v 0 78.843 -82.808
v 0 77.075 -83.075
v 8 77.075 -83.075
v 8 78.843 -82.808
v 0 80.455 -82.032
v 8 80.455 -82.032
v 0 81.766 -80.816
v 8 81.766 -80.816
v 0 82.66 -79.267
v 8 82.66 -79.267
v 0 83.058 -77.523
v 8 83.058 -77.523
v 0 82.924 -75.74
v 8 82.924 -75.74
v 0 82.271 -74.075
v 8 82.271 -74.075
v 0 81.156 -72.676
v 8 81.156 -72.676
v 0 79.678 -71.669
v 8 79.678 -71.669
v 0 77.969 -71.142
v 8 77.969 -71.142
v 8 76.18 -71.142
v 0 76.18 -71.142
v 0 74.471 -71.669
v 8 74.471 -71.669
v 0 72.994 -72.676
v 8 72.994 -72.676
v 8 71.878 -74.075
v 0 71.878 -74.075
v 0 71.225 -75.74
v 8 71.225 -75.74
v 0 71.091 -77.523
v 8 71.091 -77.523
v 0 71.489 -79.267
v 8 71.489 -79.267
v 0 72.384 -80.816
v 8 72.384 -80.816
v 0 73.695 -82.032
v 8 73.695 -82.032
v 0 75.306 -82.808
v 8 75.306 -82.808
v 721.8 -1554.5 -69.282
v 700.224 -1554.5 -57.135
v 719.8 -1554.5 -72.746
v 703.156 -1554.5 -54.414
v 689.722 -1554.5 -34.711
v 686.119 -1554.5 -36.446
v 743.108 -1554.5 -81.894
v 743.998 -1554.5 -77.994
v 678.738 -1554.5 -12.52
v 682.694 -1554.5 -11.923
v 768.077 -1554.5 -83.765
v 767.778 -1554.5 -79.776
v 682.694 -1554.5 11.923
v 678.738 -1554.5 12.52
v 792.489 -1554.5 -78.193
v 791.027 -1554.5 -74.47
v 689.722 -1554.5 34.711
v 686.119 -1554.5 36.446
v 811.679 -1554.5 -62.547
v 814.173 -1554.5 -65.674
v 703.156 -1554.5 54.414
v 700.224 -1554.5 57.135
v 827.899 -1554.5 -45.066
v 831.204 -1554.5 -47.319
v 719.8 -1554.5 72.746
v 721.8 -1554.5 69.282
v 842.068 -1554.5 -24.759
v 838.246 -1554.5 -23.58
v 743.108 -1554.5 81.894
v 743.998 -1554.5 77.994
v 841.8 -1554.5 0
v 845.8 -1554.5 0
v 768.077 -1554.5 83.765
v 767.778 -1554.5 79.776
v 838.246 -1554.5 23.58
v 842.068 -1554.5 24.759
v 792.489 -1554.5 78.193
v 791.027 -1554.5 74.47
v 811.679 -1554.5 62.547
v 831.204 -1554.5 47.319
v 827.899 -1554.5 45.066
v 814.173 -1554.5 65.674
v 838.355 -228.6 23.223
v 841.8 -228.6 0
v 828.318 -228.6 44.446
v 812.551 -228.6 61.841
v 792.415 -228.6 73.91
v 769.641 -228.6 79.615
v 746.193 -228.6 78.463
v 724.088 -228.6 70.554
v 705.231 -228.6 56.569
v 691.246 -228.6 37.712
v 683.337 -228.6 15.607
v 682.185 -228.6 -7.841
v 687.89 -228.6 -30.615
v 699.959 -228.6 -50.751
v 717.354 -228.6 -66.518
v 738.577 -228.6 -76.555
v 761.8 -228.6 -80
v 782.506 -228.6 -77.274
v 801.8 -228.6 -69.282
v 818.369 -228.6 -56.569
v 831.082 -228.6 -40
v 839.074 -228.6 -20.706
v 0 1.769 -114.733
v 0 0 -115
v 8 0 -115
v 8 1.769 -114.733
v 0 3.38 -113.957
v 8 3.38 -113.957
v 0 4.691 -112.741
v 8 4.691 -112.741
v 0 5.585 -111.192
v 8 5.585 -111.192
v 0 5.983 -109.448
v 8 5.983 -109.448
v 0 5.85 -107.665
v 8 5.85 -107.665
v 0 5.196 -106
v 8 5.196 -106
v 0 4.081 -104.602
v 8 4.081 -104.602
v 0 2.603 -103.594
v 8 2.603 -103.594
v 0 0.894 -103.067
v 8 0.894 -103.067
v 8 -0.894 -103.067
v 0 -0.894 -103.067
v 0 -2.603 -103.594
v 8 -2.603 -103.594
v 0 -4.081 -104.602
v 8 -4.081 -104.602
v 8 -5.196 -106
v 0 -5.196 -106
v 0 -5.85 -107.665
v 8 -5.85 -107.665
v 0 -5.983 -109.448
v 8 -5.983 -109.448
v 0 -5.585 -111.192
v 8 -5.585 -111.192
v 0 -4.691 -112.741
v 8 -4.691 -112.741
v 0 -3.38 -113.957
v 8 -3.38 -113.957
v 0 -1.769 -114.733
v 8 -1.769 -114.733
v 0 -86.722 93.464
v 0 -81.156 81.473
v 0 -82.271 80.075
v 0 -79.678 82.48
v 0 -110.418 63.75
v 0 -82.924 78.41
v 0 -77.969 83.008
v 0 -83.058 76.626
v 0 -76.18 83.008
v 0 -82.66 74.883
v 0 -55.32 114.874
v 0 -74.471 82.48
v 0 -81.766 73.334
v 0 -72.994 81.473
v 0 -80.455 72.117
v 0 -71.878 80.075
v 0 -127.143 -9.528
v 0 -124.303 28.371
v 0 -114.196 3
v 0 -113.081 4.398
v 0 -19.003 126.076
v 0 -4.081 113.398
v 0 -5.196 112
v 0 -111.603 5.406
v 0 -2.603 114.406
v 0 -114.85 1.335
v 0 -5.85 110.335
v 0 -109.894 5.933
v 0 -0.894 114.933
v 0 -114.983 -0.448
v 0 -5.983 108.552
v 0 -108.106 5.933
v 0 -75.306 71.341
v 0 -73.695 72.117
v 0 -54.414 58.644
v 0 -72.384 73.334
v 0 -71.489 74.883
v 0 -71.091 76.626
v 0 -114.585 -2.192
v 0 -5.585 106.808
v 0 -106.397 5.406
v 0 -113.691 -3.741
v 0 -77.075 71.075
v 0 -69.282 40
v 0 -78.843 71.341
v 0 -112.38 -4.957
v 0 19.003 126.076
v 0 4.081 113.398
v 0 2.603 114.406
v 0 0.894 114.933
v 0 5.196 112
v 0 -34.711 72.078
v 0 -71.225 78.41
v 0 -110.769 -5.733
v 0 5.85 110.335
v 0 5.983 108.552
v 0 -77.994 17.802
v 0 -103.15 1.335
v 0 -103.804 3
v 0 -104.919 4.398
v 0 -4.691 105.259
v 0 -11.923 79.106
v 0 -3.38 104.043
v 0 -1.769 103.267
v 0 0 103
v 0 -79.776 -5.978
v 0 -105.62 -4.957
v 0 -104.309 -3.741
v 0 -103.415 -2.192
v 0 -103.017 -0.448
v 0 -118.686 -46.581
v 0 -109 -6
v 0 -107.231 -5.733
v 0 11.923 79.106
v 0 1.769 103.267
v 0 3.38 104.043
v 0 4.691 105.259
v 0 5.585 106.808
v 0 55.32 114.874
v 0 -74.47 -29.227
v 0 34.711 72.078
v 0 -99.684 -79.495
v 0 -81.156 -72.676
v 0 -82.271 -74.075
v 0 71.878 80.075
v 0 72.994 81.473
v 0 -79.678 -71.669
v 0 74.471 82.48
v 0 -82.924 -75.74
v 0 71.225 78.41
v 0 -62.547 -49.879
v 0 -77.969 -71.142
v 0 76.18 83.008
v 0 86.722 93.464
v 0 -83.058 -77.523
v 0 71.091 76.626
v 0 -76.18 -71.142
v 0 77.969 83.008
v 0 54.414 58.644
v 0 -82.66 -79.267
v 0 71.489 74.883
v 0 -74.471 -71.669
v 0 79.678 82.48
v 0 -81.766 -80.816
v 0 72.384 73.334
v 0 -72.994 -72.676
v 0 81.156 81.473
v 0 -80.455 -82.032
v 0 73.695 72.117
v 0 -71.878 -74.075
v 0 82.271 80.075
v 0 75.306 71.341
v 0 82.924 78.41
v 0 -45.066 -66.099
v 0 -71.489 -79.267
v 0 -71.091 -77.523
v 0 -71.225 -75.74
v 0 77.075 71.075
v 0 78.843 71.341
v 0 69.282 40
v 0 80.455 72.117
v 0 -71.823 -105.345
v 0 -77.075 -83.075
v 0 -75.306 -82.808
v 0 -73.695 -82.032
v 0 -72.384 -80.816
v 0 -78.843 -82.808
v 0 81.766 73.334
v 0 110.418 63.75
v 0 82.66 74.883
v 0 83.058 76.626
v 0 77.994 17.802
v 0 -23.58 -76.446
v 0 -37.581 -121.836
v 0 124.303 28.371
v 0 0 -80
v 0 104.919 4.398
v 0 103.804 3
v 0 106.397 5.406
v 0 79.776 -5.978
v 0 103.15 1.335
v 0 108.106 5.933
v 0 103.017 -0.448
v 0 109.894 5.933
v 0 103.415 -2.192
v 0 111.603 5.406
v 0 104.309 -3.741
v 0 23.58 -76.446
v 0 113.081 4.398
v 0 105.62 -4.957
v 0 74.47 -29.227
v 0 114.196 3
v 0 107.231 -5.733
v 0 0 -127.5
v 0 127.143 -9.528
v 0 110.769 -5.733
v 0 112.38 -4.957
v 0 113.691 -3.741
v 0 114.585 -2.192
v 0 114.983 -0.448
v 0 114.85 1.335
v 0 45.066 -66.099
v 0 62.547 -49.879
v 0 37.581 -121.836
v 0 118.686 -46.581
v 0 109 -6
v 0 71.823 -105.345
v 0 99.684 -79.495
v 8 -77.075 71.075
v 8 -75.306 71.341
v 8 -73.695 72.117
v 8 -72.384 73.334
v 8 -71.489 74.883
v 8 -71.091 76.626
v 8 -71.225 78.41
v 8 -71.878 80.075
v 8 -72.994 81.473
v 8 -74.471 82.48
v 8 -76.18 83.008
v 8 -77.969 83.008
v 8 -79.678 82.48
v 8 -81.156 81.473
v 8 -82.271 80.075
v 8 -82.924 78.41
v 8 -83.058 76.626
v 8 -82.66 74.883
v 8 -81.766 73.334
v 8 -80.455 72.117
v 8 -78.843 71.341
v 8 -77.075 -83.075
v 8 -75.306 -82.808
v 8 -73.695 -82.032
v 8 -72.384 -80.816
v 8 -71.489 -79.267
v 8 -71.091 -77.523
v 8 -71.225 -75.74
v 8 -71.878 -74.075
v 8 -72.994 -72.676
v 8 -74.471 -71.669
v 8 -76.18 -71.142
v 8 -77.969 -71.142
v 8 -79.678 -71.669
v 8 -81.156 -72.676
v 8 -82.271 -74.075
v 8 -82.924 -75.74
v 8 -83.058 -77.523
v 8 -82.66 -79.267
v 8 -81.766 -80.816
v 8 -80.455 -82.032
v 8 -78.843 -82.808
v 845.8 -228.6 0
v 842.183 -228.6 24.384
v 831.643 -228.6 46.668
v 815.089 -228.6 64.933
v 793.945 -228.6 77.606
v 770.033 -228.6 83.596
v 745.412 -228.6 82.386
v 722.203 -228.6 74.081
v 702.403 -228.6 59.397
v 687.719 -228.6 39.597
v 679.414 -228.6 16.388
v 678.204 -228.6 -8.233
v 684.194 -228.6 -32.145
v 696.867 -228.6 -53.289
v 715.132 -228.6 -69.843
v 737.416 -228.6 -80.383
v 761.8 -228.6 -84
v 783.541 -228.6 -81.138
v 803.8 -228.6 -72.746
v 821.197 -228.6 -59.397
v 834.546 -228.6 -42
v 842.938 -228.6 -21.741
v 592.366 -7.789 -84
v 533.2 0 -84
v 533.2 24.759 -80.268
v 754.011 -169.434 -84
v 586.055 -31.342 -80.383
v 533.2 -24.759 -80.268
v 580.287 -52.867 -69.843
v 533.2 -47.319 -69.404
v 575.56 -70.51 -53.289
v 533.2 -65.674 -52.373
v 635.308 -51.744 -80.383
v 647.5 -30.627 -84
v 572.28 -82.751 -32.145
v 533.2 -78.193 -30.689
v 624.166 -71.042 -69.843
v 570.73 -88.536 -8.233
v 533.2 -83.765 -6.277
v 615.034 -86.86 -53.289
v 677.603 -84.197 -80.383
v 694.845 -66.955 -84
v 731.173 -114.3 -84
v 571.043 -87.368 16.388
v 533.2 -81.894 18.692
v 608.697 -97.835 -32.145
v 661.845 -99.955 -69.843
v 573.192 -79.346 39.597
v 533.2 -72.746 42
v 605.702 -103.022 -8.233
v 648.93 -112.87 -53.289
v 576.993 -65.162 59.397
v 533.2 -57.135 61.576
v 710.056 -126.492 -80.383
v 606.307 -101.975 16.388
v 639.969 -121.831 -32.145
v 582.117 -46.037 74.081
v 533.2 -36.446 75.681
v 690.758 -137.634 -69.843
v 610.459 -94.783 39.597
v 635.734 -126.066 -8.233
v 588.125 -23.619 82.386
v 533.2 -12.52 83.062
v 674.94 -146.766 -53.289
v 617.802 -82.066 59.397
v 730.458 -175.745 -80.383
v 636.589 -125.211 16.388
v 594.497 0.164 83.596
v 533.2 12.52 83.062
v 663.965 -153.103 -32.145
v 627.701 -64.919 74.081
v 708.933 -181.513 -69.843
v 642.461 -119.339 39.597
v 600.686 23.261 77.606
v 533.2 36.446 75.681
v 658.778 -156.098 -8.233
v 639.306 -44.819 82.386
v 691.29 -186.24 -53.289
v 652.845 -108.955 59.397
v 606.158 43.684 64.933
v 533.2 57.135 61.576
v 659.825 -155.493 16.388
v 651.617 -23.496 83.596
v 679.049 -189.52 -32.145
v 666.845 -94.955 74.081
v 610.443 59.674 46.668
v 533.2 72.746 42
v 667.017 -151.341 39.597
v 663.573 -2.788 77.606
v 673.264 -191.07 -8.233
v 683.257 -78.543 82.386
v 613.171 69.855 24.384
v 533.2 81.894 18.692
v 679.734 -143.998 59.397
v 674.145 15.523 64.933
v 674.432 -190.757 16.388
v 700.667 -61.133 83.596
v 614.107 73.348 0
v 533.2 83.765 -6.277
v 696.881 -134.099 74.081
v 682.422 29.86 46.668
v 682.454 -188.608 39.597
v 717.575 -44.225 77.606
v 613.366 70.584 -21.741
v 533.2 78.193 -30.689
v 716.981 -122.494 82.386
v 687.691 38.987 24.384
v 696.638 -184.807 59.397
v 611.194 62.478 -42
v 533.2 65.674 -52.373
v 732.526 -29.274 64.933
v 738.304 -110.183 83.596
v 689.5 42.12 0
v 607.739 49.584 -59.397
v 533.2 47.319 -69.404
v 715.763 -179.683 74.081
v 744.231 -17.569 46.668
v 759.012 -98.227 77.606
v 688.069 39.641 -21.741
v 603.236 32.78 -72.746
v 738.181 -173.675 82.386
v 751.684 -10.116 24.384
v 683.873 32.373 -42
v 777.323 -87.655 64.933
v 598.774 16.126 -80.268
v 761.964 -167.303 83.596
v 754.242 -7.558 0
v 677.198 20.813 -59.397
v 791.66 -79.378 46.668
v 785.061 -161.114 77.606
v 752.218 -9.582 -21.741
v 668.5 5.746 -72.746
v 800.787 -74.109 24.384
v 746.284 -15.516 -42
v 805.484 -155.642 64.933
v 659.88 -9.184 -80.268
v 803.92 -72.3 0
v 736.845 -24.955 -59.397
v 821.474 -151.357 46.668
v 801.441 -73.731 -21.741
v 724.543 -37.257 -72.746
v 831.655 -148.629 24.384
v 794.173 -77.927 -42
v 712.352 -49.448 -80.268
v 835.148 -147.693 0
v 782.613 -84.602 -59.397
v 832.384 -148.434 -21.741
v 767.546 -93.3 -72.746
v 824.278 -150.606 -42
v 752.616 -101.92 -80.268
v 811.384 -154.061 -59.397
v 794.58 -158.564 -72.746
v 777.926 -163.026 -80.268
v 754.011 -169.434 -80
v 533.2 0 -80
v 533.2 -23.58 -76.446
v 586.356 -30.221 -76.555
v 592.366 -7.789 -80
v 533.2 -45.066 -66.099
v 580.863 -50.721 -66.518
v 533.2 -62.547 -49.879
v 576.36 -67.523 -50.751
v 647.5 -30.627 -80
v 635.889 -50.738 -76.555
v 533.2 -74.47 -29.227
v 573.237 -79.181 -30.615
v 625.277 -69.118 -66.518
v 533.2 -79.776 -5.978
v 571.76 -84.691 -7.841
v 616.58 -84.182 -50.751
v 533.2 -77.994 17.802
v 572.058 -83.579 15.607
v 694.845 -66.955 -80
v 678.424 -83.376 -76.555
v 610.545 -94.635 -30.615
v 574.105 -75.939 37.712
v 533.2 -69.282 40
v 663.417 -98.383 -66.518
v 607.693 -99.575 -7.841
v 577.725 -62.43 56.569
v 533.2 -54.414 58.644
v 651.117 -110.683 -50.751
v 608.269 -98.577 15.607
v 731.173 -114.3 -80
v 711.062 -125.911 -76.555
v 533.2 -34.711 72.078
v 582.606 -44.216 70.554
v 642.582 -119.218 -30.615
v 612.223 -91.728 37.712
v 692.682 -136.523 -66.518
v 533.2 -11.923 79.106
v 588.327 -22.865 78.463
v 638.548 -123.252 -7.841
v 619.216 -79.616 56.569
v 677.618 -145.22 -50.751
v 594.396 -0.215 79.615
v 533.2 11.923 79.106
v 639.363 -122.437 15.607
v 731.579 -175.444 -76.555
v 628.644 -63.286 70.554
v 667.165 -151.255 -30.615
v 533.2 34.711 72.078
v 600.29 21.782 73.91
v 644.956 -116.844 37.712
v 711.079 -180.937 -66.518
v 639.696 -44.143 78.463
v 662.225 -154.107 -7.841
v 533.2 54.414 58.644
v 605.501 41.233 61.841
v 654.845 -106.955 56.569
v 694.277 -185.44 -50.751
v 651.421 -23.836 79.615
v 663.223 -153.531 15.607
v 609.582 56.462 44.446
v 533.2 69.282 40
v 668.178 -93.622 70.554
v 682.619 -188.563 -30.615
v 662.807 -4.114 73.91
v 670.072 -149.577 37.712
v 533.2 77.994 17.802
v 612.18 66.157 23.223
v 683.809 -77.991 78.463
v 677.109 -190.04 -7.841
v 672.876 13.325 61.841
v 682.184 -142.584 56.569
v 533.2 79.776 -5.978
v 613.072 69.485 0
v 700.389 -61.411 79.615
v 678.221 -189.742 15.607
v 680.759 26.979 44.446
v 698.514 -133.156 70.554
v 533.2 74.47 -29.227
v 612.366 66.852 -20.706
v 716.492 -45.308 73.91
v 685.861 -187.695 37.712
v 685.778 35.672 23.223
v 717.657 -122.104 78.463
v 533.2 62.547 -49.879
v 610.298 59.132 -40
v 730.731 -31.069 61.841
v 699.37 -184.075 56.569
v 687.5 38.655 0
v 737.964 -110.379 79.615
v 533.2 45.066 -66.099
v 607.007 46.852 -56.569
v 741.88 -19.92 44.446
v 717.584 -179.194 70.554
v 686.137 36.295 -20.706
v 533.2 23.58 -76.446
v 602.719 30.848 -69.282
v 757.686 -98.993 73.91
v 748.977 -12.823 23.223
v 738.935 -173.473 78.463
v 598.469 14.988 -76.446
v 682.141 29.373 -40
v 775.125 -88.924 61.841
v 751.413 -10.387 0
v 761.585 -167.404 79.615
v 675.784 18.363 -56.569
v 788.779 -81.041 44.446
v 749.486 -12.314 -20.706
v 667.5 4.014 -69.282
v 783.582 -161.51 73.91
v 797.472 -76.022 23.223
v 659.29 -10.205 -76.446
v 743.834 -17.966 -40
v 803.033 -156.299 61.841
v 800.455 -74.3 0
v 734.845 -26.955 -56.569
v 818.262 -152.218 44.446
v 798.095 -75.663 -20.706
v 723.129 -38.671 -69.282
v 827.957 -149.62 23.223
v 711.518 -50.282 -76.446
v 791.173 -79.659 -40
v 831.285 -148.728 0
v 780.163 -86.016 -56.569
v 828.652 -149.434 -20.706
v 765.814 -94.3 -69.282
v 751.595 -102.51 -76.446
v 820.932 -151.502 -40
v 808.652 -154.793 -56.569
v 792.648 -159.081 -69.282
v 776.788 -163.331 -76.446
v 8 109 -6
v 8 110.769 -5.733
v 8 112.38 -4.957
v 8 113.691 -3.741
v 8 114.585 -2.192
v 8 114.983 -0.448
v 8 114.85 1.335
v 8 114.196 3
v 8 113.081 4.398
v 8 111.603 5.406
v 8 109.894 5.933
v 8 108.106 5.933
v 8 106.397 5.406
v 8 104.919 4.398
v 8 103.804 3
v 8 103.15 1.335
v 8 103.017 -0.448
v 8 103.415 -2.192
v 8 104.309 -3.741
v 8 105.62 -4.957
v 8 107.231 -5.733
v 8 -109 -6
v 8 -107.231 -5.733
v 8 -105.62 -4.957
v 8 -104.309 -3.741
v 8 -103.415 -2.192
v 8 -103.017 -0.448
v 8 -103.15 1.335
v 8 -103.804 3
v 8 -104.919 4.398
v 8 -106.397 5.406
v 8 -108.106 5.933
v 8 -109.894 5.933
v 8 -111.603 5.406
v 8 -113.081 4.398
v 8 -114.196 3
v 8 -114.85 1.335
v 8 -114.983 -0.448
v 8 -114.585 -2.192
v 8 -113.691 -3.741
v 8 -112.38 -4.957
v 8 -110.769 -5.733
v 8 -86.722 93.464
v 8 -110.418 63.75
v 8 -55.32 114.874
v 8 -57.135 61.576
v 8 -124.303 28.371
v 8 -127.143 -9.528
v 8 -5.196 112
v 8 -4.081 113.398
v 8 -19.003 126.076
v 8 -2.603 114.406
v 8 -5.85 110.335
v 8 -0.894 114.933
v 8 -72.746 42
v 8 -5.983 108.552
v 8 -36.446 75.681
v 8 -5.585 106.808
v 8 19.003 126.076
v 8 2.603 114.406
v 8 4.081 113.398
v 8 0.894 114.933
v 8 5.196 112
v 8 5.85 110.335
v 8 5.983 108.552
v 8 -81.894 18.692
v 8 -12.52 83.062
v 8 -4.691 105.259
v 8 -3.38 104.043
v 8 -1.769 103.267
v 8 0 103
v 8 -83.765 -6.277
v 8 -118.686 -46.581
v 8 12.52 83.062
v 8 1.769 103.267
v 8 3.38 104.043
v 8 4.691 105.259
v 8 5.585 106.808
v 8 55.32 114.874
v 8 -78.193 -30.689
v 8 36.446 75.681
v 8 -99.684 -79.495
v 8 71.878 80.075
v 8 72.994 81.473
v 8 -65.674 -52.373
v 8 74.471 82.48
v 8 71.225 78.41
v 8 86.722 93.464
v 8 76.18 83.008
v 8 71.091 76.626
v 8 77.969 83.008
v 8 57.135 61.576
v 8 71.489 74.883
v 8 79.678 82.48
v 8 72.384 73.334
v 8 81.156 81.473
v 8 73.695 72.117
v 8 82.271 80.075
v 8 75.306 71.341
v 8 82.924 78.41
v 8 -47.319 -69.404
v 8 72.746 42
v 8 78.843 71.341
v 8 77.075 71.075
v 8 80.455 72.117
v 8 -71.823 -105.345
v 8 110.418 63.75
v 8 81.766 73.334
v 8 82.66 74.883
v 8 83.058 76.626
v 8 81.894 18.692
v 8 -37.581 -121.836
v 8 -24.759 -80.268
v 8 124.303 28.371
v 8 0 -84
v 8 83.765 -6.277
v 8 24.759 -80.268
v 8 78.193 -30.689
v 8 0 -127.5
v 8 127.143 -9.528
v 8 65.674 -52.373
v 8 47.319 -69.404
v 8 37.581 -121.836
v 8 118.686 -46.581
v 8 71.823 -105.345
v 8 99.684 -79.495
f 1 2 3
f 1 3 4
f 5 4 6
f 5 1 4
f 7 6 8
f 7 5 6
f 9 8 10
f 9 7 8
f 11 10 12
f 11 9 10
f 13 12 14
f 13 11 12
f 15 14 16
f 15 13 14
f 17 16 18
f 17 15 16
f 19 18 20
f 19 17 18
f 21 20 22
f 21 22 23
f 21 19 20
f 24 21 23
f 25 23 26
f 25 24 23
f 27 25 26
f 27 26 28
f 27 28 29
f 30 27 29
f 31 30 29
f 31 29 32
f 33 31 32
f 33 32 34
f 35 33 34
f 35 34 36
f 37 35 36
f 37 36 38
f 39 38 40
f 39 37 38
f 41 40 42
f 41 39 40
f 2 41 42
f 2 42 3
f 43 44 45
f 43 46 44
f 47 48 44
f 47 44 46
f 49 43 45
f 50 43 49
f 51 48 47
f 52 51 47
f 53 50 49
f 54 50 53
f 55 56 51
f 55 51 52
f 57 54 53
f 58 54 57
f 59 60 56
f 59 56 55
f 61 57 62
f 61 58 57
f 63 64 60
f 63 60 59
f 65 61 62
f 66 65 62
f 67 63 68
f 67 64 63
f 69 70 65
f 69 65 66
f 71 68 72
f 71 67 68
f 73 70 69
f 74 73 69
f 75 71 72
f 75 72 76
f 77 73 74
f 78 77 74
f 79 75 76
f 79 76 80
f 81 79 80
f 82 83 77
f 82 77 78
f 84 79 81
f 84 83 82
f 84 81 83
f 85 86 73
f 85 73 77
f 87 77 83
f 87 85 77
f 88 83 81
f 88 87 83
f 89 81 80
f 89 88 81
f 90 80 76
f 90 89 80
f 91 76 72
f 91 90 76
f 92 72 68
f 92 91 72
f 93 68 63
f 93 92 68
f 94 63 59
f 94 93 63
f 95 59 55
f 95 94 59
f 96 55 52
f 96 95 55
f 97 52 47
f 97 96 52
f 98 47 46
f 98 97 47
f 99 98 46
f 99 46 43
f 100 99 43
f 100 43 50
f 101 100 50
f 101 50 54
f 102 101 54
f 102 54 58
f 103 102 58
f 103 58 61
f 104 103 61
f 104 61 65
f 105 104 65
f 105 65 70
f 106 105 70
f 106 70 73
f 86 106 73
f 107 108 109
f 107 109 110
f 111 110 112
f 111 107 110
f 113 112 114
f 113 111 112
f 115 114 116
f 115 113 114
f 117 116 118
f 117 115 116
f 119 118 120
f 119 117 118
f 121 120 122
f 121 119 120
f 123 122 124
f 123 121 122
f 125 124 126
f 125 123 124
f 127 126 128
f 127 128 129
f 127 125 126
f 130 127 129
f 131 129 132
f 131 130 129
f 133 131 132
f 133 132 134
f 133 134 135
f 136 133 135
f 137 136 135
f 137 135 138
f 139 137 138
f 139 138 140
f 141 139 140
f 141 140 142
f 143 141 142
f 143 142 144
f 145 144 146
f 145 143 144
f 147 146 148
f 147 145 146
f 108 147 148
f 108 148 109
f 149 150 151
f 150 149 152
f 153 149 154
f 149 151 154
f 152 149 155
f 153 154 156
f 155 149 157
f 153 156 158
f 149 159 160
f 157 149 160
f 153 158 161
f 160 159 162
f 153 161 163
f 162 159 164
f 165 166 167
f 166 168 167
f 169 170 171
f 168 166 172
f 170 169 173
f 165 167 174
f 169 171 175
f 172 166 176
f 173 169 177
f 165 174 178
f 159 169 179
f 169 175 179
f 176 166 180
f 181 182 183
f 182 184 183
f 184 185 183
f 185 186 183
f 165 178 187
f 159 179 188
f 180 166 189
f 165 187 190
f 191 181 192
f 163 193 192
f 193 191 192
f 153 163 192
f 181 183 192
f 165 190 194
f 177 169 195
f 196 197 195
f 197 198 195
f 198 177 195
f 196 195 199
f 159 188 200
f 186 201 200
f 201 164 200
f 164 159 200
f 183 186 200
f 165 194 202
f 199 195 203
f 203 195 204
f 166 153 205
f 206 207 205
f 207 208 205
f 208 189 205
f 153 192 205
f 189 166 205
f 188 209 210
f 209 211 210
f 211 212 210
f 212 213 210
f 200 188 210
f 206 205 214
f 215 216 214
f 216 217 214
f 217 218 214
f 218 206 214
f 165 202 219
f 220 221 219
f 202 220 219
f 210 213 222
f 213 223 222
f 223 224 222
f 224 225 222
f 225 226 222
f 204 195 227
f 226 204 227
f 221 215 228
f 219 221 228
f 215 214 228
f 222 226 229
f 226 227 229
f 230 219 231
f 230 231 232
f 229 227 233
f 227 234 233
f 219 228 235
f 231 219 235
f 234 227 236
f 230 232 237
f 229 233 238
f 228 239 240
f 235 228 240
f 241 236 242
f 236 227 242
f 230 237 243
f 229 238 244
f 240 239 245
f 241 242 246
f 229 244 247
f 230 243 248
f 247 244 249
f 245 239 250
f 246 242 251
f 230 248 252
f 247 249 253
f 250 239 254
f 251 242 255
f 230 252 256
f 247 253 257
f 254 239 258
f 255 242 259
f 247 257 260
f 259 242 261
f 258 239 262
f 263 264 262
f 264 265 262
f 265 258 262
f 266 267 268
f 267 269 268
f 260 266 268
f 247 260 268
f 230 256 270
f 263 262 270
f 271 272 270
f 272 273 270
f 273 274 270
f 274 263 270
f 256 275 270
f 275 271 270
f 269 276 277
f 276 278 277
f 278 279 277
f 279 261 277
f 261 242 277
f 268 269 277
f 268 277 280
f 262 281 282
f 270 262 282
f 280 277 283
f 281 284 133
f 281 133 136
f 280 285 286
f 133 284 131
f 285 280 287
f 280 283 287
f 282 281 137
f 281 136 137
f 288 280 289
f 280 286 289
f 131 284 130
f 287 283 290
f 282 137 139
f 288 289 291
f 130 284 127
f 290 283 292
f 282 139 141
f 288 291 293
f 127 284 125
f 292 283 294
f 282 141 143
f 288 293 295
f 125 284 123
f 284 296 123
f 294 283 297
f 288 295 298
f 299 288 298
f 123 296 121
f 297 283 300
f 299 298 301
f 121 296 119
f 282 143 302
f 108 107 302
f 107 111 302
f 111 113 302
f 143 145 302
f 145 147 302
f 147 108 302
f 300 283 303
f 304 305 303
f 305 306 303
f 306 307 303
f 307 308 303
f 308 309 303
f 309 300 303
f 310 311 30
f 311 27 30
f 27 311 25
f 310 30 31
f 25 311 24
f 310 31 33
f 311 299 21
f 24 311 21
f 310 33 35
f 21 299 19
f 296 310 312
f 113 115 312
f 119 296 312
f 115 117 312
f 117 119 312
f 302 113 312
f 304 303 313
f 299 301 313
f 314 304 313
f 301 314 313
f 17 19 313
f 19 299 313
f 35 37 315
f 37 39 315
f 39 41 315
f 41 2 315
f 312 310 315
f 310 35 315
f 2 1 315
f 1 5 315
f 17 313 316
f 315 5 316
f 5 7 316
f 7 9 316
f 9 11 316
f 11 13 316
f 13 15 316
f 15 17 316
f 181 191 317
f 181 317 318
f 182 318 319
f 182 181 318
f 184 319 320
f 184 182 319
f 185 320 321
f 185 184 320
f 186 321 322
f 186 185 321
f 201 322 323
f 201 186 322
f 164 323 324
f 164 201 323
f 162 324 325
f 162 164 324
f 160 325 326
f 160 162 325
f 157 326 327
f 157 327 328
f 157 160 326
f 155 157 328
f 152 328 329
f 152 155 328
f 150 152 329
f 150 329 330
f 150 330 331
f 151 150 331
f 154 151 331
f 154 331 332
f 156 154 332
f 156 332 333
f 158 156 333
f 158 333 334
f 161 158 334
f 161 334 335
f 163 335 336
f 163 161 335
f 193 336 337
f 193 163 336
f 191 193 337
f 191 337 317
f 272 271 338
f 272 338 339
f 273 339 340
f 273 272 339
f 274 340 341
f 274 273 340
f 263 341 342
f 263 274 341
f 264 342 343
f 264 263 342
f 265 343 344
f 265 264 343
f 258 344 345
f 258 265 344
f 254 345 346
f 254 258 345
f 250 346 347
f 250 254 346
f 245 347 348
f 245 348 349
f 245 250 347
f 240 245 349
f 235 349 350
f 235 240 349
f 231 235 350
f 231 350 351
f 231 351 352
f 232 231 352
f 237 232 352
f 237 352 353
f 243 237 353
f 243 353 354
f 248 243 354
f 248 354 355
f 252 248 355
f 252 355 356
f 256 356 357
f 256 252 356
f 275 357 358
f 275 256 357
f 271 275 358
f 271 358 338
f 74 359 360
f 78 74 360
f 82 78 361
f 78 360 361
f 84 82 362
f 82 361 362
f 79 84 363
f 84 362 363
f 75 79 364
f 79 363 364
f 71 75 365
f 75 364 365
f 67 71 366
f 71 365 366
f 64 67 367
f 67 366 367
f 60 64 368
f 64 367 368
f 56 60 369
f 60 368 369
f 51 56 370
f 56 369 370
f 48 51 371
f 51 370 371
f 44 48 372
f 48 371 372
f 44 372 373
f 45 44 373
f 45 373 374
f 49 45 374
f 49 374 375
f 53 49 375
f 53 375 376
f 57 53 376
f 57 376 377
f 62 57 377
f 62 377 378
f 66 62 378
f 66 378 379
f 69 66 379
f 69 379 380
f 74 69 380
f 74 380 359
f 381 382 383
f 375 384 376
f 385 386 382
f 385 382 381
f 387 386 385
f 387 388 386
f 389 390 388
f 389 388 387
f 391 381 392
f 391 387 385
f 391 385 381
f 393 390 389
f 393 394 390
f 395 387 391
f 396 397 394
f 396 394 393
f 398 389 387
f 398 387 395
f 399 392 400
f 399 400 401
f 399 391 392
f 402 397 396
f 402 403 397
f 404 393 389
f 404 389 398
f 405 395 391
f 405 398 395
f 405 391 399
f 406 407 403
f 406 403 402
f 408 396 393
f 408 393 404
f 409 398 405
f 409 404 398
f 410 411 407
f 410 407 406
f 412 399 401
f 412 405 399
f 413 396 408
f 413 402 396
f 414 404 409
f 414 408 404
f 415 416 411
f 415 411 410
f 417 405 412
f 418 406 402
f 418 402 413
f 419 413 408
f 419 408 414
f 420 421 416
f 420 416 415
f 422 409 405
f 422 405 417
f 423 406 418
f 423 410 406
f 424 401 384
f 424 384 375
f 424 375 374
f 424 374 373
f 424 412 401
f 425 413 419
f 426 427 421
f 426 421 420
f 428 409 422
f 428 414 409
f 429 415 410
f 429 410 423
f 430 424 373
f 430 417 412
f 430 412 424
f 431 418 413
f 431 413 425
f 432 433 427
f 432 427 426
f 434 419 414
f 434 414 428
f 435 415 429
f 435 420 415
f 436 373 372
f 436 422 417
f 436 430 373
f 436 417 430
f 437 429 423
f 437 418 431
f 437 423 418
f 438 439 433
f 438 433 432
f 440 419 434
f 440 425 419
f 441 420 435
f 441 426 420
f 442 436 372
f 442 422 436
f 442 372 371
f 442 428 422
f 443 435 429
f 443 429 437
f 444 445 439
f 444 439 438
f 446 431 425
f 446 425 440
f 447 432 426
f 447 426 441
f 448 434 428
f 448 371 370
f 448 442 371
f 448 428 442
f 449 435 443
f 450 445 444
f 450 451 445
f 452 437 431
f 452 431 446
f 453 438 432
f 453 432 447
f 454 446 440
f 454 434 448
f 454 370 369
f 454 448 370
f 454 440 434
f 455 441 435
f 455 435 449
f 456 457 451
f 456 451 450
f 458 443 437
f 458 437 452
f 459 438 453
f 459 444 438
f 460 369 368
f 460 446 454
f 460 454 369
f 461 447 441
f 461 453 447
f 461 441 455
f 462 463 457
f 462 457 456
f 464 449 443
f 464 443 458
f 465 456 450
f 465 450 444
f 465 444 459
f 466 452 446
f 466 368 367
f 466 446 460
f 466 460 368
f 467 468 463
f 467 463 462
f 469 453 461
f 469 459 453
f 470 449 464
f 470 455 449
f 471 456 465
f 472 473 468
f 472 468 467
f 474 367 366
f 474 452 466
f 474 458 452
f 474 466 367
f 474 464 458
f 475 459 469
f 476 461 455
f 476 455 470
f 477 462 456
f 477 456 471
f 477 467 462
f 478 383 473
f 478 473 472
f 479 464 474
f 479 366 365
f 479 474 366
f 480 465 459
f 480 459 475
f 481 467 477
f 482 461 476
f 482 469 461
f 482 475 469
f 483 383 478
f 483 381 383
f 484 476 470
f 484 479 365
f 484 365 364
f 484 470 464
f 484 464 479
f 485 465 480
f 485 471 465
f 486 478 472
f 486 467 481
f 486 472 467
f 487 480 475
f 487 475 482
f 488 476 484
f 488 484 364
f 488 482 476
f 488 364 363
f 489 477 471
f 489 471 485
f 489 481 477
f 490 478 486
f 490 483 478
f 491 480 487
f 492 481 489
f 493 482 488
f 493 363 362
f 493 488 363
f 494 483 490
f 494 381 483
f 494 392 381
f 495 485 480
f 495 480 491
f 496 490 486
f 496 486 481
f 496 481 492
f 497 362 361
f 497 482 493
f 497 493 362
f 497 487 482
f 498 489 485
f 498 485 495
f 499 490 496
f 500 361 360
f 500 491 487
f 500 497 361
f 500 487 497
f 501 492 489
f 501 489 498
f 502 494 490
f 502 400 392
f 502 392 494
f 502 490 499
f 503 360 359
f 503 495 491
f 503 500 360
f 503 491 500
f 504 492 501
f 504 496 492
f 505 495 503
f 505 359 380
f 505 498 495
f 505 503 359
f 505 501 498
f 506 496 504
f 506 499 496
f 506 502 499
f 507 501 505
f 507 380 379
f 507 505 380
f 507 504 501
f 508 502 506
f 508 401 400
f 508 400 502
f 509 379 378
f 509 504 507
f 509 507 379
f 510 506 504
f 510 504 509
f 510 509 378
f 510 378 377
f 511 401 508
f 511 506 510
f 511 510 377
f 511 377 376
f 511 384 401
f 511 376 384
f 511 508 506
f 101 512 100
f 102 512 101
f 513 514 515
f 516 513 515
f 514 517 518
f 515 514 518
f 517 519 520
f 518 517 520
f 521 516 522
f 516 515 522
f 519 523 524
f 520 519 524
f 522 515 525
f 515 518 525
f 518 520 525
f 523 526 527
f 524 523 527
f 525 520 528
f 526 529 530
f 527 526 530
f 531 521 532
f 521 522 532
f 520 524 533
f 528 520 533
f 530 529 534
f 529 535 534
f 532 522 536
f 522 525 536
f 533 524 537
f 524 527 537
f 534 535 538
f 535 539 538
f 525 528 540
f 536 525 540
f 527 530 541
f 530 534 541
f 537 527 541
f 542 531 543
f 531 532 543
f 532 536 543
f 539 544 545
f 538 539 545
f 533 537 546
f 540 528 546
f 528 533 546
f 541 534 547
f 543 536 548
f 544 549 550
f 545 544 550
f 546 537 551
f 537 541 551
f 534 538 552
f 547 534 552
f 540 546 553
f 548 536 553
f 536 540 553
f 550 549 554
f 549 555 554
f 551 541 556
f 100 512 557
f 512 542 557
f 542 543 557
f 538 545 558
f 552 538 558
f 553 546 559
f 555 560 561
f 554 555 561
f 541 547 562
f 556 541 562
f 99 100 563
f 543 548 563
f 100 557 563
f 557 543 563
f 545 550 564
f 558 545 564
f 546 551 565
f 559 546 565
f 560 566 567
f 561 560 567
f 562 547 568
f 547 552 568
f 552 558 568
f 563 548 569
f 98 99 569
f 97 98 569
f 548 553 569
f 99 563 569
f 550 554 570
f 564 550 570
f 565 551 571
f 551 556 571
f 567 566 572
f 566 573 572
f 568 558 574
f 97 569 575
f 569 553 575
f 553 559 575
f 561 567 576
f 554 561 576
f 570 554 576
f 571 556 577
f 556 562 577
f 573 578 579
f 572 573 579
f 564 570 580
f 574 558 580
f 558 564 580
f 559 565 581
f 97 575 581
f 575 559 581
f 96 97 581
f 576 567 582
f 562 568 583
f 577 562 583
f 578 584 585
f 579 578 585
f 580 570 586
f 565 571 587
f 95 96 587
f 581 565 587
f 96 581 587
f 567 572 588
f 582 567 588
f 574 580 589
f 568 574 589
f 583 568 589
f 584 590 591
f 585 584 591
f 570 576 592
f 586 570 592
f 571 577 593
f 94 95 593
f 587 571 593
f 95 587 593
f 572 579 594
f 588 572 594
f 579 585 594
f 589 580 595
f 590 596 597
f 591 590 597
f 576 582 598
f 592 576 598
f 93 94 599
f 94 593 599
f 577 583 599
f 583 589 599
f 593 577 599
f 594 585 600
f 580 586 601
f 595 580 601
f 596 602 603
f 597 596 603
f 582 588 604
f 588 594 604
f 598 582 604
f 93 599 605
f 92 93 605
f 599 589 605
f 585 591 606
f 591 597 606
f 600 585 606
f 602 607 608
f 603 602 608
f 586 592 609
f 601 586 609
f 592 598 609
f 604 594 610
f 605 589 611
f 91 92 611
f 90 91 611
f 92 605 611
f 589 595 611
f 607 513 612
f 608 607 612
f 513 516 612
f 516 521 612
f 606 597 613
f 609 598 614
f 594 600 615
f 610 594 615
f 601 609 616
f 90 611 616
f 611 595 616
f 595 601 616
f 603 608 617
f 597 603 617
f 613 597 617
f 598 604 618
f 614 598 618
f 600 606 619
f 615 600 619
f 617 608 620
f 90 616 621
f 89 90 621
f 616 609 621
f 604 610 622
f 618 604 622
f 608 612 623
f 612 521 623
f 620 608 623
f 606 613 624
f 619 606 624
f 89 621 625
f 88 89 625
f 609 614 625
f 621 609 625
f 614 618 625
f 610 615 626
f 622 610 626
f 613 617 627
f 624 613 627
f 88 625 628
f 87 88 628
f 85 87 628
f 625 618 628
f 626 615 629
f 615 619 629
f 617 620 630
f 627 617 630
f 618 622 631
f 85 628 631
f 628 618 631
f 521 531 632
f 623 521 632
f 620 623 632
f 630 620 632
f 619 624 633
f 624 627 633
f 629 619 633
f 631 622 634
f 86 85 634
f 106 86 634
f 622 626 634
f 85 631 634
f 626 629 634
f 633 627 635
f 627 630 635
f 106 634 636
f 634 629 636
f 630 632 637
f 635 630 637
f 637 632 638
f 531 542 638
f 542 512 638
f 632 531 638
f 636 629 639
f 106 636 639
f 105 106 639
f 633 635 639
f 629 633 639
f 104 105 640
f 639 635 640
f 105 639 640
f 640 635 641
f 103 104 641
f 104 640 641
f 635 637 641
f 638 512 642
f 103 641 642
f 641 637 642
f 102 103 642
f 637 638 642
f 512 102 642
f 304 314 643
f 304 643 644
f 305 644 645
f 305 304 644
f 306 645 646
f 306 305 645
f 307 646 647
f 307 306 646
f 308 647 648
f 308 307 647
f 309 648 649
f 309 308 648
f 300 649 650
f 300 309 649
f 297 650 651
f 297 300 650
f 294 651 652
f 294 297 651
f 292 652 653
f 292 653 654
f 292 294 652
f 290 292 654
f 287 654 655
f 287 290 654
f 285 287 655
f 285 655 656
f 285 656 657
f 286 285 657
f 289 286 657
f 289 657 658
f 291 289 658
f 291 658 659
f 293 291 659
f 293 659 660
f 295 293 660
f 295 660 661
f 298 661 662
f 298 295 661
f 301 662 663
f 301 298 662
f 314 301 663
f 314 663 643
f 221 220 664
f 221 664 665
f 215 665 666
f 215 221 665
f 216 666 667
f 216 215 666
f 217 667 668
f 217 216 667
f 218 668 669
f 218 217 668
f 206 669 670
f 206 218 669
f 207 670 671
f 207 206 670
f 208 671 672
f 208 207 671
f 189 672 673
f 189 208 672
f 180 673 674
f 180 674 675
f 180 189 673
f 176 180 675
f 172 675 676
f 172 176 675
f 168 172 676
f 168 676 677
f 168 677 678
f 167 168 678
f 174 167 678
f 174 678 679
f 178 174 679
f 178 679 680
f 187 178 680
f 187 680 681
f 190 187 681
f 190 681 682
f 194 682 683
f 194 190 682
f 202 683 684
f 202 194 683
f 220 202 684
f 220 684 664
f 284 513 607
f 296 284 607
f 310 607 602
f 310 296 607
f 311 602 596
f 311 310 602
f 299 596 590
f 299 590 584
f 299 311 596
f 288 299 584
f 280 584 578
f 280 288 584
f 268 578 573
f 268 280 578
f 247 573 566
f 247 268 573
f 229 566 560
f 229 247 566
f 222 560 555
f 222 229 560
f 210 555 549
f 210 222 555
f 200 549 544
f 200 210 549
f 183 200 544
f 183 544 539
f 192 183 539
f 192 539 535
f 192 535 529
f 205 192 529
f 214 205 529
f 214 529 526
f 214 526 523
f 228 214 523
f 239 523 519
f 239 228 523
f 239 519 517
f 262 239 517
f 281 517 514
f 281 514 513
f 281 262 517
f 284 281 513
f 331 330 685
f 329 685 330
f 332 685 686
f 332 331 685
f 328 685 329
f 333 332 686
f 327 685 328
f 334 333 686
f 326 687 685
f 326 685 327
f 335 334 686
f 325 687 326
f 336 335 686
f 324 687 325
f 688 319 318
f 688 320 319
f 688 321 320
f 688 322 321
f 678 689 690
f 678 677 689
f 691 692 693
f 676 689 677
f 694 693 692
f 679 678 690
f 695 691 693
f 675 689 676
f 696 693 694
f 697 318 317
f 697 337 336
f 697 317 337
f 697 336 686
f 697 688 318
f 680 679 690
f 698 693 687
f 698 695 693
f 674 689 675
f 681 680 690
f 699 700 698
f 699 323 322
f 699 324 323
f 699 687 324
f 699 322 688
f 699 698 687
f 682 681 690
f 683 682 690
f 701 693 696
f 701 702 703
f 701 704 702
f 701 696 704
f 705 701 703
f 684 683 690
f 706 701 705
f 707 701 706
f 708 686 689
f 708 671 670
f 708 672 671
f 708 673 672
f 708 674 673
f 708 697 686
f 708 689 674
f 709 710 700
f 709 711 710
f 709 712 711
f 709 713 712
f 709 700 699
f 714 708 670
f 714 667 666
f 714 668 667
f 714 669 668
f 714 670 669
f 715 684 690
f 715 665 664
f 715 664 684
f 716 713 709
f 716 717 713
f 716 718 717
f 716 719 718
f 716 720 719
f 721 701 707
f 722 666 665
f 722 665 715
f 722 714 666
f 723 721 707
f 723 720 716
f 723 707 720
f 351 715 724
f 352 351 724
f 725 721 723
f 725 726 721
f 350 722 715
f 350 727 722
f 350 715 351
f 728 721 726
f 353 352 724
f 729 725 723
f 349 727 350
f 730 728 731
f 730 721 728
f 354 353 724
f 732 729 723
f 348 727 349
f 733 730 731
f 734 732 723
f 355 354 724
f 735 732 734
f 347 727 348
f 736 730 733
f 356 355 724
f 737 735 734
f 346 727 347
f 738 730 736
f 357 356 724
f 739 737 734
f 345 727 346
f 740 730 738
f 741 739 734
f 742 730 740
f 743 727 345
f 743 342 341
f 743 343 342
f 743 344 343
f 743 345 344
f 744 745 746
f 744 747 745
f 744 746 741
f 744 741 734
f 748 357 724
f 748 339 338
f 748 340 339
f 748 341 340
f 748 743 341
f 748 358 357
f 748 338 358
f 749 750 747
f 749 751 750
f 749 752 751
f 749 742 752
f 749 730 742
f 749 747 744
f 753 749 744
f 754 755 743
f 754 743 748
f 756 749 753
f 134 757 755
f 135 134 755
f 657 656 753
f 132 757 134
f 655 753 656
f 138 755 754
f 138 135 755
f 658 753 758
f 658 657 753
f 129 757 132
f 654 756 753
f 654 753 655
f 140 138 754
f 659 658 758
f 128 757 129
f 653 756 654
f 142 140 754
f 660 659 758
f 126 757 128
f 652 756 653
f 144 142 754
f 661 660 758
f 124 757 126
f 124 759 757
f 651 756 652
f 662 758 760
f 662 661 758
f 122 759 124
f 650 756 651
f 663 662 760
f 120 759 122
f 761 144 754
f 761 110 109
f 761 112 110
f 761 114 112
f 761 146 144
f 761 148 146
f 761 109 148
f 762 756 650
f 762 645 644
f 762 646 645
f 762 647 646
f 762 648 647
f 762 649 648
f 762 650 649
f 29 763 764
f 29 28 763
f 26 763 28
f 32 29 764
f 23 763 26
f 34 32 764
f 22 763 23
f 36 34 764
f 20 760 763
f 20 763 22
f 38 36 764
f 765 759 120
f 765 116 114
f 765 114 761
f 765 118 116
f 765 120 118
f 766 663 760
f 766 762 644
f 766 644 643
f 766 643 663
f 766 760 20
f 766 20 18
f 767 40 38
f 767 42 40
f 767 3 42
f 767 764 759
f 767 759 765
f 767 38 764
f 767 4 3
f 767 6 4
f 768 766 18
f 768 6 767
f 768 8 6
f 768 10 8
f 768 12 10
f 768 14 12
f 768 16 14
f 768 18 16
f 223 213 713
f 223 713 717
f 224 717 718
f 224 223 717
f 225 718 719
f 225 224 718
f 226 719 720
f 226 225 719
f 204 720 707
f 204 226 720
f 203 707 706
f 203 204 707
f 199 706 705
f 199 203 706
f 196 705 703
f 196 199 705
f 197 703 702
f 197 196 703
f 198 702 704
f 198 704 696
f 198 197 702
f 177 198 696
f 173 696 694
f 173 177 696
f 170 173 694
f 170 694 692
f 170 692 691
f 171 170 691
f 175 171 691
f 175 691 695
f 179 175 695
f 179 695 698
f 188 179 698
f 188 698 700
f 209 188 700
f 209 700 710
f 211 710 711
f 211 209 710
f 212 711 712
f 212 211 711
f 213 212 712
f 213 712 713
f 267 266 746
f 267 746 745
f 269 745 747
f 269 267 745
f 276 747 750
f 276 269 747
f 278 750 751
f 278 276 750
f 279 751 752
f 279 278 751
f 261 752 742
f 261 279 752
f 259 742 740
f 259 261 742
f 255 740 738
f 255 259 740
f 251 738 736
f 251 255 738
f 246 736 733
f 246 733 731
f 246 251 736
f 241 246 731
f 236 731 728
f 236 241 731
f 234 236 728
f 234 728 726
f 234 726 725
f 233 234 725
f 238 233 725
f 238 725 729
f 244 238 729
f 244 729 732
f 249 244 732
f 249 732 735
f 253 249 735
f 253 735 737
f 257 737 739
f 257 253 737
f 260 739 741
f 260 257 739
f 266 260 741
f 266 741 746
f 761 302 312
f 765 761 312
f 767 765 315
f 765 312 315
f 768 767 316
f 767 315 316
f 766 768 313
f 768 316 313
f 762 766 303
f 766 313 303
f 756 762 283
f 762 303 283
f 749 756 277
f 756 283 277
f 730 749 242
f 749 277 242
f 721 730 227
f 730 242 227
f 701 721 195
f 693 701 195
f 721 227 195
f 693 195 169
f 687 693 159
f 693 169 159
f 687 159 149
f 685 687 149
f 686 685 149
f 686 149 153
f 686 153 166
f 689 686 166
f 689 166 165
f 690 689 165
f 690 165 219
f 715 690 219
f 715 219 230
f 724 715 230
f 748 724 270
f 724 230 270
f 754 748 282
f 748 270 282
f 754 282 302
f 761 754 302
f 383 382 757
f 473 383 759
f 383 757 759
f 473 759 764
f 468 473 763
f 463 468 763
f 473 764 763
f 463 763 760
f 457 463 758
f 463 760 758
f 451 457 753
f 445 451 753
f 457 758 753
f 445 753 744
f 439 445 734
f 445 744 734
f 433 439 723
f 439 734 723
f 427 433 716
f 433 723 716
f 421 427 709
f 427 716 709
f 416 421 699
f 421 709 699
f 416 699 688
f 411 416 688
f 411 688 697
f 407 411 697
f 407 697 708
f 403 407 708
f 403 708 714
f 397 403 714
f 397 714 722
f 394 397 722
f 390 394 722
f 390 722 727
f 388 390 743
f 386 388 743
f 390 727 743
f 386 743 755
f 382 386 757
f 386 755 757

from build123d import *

# Parameters (mm, degrees)
SKETCH1_R           = 127.5
SKETCH1_R_2         = 80
SKETCH1_R_3         = 6
BOSS_EXTRUDE1_DEPTH = 8
SKETCH2_R           = 84
SKETCH2_R_2         = 80
BOSS_EXTRUDE2_DEPTH = 525.2
SKETCH3_R           = 84
SKETCH3_R_2         = 80
SKETCH5_R           = 84
SKETCH5_R_2         = 80
BOSS_EXTRUDE3_DEPTH = 1325.9


with BuildPart() as part:
    # Sketch1 → Boss-Extrude1 (new body)
    with BuildSketch(Plane(origin=(0, 0, 0), x_dir=(0, 0, -1), z_dir=(1, 0, 0))):
        Circle(SKETCH1_R)
        Circle(SKETCH1_R_2, mode=Mode.SUBTRACT)
        with Locations((0, 109)):
            Circle(SKETCH1_R_3, mode=Mode.SUBTRACT)
        with Locations((77.074639149, 77.074639149)):
            Circle(SKETCH1_R_3, mode=Mode.SUBTRACT)
        with Locations((109, 0)):
            Circle(SKETCH1_R_3, mode=Mode.SUBTRACT)
        with Locations((77.074639149, -77.074639149)):
            Circle(SKETCH1_R_3, mode=Mode.SUBTRACT)
        with Locations((0, -109)):
            Circle(SKETCH1_R_3, mode=Mode.SUBTRACT)
        with Locations((-77.074639149, -77.074639149)):
            Circle(SKETCH1_R_3, mode=Mode.SUBTRACT)
        with Locations((-109, 0)):
            Circle(SKETCH1_R_3, mode=Mode.SUBTRACT)
        with Locations((-77.074639149, 77.074639149)):
            Circle(SKETCH1_R_3, mode=Mode.SUBTRACT)
    extrude(amount=BOSS_EXTRUDE1_DEPTH)

    # Sketch2 → Boss-Extrude2 (add)
    with BuildSketch(Plane(origin=(8, 0, 0), x_dir=(0, 0, -1), z_dir=(1, 0, 0))):
        Circle(SKETCH2_R)
        Circle(SKETCH2_R_2, mode=Mode.SUBTRACT)
    extrude(amount=BOSS_EXTRUDE2_DEPTH)

    # Sweep1: sweep along a path in Sketch4
    with BuildLine(Plane.XY) as sweep1_path:
        ThreePointArc((533.2, 0), (694.844610179, -66.955389821), (761.8, -228.6))
    # Sketch3 → Sweep1 (sweep)
    with BuildSketch(Plane(origin=(533.2, 0, 0), x_dir=(0, 0, -1), z_dir=(1, 0, 0))):
        Circle(SKETCH3_R)
        Circle(SKETCH3_R_2, mode=Mode.SUBTRACT)
    sweep(path=sweep1_path.line)

    # Sketch5 → Boss-Extrude3 (add)
    with BuildSketch(Plane.XZ.offset(228.6)):
        with Locations((761.8, 0)):
            Circle(SKETCH5_R)
        with Locations((761.8, 0)):
            Circle(SKETCH5_R_2, mode=Mode.SUBTRACT)
    extrude(amount=BOSS_EXTRUDE3_DEPTH)


solid = part.part
